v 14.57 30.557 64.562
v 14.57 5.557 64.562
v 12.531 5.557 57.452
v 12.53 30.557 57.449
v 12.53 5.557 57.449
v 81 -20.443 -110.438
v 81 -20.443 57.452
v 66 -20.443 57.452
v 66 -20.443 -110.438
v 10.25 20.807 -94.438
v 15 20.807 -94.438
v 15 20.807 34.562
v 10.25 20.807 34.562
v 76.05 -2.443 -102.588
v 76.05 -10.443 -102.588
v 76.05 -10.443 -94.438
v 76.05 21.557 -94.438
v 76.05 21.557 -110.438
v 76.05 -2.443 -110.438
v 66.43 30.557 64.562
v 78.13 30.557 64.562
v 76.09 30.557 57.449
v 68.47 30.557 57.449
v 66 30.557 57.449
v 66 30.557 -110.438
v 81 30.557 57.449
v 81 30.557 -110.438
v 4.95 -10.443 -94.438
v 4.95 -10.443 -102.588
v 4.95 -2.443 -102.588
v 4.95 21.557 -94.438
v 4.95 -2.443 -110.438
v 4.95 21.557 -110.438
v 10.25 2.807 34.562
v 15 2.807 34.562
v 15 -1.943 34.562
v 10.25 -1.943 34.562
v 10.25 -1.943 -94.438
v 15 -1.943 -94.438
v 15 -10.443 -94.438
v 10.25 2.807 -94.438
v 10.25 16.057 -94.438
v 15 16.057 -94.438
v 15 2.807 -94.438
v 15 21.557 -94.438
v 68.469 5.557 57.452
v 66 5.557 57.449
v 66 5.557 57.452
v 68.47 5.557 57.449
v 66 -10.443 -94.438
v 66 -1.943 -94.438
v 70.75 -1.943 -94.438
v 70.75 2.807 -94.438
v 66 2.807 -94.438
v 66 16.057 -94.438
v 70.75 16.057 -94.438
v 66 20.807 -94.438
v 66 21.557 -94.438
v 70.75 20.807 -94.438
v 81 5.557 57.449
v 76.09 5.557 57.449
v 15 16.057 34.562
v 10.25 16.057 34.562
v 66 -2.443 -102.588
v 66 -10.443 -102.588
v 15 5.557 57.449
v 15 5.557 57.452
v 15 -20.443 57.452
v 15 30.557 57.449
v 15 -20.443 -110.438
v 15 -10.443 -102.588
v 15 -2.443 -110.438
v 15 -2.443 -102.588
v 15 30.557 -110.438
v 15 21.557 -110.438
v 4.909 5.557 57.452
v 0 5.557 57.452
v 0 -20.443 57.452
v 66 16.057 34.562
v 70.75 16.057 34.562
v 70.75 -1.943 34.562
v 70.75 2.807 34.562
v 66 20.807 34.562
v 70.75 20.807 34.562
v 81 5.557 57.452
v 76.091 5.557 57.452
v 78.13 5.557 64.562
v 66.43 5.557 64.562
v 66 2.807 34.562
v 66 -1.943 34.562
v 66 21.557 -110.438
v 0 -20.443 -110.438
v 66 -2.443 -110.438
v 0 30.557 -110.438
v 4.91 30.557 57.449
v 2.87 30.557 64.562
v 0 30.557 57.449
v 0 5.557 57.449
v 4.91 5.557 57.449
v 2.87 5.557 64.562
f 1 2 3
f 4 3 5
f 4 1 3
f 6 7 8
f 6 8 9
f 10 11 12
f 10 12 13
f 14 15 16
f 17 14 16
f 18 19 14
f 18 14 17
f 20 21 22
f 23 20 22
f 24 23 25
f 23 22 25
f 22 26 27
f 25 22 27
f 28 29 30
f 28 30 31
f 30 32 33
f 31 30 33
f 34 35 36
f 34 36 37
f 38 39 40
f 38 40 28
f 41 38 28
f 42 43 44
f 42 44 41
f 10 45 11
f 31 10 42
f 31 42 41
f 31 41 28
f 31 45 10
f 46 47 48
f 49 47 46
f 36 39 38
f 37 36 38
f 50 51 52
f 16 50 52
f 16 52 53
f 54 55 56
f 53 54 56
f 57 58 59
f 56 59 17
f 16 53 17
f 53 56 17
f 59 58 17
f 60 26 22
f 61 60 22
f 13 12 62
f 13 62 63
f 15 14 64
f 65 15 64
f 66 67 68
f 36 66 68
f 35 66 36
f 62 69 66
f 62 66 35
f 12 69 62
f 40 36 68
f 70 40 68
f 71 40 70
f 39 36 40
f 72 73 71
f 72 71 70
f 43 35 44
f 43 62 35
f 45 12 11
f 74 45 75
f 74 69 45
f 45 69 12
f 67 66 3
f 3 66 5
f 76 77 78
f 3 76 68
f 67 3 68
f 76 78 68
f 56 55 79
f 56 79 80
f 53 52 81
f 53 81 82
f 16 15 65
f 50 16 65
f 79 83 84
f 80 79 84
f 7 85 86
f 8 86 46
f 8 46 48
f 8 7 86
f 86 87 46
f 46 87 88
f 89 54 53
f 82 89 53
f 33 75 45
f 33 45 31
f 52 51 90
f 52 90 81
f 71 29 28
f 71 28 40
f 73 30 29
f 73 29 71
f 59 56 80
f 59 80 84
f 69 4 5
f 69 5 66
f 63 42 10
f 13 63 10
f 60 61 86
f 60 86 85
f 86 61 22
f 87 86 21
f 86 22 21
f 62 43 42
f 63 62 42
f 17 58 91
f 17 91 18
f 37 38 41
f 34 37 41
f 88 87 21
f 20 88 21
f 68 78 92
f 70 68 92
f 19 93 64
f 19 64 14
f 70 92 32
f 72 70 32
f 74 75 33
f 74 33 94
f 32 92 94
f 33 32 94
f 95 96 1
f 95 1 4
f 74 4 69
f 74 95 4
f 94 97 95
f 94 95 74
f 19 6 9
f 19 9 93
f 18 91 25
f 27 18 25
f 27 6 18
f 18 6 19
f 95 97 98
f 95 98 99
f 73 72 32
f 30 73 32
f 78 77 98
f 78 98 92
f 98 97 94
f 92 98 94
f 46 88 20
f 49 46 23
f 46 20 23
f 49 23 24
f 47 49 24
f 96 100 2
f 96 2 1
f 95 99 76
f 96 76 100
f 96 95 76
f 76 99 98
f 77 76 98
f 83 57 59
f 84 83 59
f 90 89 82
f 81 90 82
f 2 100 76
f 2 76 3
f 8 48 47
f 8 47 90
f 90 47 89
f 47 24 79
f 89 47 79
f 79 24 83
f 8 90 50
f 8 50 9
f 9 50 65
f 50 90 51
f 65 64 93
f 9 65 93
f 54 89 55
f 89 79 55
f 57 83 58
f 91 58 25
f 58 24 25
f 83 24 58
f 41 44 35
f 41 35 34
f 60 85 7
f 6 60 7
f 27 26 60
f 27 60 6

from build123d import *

# Parameters (mm, degrees)
SKETCH1_W           = 175
SKETCH1_H           = 51
BOSS_EXTRUDE1_DEPTH = 15
SKETCH7_W           = 4.75
SKETCH7_H           = 4.75
CUT_EXTRUDE5_DEPTH  = 145
SKETCH10_W          = 10.05
SKETCH10_H          = 24
CUT_EXTRUDE6_DEPTH  = 16
SKETCH11_W          = 10.05
SKETCH11_H          = 8.15
CUT_EXTRUDE7_DEPTH  = 8
CUT_EXTRUDE8_DEPTH  = 25
SKETCH13_W          = 15
SKETCH13_H          = 7.11
CUT_EXTRUDE9_DEPTH  = 26


with BuildPart() as part:
    # Sketch1 → Boss-Extrude1 (new body)
    with BuildSketch(Plane(origin=(0, 0, 0), x_dir=(0, 0, -1), z_dir=(1, 0, 0))):
        with Locations((22.937921078, 5.057266603)):
            Rectangle(SKETCH1_W, SKETCH1_H)
    extrude(amount=BOSS_EXTRUDE1_DEPTH)

    # Sketch7 → Cut-Extrude5 (cut)
    with BuildSketch(Plane(origin=(0, 0, -110.437921078), x_dir=(-1, 0, 0), z_dir=(0, 0, -1))):
        with Locations((-12.625, 0.432266603)):
            Rectangle(SKETCH7_W, SKETCH7_H)
        with Locations((-12.625, 18.432266603)):
            Rectangle(SKETCH7_W, SKETCH7_H)
    extrude(amount=-CUT_EXTRUDE5_DEPTH, mode=Mode.SUBTRACT)

    # Sketch10 → Cut-Extrude6 (cut)
    with BuildSketch(Plane(origin=(0, 0, -110.437921078), x_dir=(-1, 0, 0), z_dir=(0, 0, -1))):
        with Locations((-9.975, 9.557266603)):
            Rectangle(SKETCH10_W, SKETCH10_H)
    extrude(amount=-CUT_EXTRUDE6_DEPTH, mode=Mode.SUBTRACT)

    # Sketch11 → Cut-Extrude7 (cut)
    with BuildSketch(Plane(origin=(0, -2.442733397, 0), x_dir=(1, 0, 0), z_dir=(0, 1, 0))):
        with Locations((9.975, 98.512921078)):
            Rectangle(SKETCH11_W, SKETCH11_H)
    extrude(amount=-CUT_EXTRUDE7_DEPTH, mode=Mode.SUBTRACT)

    # Sketch12 → Cut-Extrude8 (cut)
    with BuildSketch(Plane(origin=(0, 30.557266603, 0), x_dir=(1, 0, 0), z_dir=(0, 1, 0))):
        Polygon((0, -57.448742372), (4.909716433, -57.448742372), (2.87, -64.562078922), (0, -64.562078922), align=None)
        Polygon((15, -57.448742372), (15, -64.562078922), (14.57, -64.562078922), (12.530283567, -57.448742372), align=None)
    extrude(amount=-CUT_EXTRUDE8_DEPTH, mode=Mode.SUBTRACT)

    # Sketch13 → Cut-Extrude9 (cut)
    with BuildSketch(Plane.XZ.offset(20.442733397)):
        with Locations((7.5, 61.007078922)):
            Rectangle(SKETCH13_W, SKETCH13_H)
    extrude(amount=-CUT_EXTRUDE9_DEPTH, mode=Mode.SUBTRACT)


with BuildPart() as body_2:
    # Mirror4: mirrored copy
    add(part.part.mirror(Plane(origin=(40.5, 0, 0), x_dir=(0, 0, 1), z_dir=(1, 0, 0))))


solid = Compound([part.part, body_2.part])
